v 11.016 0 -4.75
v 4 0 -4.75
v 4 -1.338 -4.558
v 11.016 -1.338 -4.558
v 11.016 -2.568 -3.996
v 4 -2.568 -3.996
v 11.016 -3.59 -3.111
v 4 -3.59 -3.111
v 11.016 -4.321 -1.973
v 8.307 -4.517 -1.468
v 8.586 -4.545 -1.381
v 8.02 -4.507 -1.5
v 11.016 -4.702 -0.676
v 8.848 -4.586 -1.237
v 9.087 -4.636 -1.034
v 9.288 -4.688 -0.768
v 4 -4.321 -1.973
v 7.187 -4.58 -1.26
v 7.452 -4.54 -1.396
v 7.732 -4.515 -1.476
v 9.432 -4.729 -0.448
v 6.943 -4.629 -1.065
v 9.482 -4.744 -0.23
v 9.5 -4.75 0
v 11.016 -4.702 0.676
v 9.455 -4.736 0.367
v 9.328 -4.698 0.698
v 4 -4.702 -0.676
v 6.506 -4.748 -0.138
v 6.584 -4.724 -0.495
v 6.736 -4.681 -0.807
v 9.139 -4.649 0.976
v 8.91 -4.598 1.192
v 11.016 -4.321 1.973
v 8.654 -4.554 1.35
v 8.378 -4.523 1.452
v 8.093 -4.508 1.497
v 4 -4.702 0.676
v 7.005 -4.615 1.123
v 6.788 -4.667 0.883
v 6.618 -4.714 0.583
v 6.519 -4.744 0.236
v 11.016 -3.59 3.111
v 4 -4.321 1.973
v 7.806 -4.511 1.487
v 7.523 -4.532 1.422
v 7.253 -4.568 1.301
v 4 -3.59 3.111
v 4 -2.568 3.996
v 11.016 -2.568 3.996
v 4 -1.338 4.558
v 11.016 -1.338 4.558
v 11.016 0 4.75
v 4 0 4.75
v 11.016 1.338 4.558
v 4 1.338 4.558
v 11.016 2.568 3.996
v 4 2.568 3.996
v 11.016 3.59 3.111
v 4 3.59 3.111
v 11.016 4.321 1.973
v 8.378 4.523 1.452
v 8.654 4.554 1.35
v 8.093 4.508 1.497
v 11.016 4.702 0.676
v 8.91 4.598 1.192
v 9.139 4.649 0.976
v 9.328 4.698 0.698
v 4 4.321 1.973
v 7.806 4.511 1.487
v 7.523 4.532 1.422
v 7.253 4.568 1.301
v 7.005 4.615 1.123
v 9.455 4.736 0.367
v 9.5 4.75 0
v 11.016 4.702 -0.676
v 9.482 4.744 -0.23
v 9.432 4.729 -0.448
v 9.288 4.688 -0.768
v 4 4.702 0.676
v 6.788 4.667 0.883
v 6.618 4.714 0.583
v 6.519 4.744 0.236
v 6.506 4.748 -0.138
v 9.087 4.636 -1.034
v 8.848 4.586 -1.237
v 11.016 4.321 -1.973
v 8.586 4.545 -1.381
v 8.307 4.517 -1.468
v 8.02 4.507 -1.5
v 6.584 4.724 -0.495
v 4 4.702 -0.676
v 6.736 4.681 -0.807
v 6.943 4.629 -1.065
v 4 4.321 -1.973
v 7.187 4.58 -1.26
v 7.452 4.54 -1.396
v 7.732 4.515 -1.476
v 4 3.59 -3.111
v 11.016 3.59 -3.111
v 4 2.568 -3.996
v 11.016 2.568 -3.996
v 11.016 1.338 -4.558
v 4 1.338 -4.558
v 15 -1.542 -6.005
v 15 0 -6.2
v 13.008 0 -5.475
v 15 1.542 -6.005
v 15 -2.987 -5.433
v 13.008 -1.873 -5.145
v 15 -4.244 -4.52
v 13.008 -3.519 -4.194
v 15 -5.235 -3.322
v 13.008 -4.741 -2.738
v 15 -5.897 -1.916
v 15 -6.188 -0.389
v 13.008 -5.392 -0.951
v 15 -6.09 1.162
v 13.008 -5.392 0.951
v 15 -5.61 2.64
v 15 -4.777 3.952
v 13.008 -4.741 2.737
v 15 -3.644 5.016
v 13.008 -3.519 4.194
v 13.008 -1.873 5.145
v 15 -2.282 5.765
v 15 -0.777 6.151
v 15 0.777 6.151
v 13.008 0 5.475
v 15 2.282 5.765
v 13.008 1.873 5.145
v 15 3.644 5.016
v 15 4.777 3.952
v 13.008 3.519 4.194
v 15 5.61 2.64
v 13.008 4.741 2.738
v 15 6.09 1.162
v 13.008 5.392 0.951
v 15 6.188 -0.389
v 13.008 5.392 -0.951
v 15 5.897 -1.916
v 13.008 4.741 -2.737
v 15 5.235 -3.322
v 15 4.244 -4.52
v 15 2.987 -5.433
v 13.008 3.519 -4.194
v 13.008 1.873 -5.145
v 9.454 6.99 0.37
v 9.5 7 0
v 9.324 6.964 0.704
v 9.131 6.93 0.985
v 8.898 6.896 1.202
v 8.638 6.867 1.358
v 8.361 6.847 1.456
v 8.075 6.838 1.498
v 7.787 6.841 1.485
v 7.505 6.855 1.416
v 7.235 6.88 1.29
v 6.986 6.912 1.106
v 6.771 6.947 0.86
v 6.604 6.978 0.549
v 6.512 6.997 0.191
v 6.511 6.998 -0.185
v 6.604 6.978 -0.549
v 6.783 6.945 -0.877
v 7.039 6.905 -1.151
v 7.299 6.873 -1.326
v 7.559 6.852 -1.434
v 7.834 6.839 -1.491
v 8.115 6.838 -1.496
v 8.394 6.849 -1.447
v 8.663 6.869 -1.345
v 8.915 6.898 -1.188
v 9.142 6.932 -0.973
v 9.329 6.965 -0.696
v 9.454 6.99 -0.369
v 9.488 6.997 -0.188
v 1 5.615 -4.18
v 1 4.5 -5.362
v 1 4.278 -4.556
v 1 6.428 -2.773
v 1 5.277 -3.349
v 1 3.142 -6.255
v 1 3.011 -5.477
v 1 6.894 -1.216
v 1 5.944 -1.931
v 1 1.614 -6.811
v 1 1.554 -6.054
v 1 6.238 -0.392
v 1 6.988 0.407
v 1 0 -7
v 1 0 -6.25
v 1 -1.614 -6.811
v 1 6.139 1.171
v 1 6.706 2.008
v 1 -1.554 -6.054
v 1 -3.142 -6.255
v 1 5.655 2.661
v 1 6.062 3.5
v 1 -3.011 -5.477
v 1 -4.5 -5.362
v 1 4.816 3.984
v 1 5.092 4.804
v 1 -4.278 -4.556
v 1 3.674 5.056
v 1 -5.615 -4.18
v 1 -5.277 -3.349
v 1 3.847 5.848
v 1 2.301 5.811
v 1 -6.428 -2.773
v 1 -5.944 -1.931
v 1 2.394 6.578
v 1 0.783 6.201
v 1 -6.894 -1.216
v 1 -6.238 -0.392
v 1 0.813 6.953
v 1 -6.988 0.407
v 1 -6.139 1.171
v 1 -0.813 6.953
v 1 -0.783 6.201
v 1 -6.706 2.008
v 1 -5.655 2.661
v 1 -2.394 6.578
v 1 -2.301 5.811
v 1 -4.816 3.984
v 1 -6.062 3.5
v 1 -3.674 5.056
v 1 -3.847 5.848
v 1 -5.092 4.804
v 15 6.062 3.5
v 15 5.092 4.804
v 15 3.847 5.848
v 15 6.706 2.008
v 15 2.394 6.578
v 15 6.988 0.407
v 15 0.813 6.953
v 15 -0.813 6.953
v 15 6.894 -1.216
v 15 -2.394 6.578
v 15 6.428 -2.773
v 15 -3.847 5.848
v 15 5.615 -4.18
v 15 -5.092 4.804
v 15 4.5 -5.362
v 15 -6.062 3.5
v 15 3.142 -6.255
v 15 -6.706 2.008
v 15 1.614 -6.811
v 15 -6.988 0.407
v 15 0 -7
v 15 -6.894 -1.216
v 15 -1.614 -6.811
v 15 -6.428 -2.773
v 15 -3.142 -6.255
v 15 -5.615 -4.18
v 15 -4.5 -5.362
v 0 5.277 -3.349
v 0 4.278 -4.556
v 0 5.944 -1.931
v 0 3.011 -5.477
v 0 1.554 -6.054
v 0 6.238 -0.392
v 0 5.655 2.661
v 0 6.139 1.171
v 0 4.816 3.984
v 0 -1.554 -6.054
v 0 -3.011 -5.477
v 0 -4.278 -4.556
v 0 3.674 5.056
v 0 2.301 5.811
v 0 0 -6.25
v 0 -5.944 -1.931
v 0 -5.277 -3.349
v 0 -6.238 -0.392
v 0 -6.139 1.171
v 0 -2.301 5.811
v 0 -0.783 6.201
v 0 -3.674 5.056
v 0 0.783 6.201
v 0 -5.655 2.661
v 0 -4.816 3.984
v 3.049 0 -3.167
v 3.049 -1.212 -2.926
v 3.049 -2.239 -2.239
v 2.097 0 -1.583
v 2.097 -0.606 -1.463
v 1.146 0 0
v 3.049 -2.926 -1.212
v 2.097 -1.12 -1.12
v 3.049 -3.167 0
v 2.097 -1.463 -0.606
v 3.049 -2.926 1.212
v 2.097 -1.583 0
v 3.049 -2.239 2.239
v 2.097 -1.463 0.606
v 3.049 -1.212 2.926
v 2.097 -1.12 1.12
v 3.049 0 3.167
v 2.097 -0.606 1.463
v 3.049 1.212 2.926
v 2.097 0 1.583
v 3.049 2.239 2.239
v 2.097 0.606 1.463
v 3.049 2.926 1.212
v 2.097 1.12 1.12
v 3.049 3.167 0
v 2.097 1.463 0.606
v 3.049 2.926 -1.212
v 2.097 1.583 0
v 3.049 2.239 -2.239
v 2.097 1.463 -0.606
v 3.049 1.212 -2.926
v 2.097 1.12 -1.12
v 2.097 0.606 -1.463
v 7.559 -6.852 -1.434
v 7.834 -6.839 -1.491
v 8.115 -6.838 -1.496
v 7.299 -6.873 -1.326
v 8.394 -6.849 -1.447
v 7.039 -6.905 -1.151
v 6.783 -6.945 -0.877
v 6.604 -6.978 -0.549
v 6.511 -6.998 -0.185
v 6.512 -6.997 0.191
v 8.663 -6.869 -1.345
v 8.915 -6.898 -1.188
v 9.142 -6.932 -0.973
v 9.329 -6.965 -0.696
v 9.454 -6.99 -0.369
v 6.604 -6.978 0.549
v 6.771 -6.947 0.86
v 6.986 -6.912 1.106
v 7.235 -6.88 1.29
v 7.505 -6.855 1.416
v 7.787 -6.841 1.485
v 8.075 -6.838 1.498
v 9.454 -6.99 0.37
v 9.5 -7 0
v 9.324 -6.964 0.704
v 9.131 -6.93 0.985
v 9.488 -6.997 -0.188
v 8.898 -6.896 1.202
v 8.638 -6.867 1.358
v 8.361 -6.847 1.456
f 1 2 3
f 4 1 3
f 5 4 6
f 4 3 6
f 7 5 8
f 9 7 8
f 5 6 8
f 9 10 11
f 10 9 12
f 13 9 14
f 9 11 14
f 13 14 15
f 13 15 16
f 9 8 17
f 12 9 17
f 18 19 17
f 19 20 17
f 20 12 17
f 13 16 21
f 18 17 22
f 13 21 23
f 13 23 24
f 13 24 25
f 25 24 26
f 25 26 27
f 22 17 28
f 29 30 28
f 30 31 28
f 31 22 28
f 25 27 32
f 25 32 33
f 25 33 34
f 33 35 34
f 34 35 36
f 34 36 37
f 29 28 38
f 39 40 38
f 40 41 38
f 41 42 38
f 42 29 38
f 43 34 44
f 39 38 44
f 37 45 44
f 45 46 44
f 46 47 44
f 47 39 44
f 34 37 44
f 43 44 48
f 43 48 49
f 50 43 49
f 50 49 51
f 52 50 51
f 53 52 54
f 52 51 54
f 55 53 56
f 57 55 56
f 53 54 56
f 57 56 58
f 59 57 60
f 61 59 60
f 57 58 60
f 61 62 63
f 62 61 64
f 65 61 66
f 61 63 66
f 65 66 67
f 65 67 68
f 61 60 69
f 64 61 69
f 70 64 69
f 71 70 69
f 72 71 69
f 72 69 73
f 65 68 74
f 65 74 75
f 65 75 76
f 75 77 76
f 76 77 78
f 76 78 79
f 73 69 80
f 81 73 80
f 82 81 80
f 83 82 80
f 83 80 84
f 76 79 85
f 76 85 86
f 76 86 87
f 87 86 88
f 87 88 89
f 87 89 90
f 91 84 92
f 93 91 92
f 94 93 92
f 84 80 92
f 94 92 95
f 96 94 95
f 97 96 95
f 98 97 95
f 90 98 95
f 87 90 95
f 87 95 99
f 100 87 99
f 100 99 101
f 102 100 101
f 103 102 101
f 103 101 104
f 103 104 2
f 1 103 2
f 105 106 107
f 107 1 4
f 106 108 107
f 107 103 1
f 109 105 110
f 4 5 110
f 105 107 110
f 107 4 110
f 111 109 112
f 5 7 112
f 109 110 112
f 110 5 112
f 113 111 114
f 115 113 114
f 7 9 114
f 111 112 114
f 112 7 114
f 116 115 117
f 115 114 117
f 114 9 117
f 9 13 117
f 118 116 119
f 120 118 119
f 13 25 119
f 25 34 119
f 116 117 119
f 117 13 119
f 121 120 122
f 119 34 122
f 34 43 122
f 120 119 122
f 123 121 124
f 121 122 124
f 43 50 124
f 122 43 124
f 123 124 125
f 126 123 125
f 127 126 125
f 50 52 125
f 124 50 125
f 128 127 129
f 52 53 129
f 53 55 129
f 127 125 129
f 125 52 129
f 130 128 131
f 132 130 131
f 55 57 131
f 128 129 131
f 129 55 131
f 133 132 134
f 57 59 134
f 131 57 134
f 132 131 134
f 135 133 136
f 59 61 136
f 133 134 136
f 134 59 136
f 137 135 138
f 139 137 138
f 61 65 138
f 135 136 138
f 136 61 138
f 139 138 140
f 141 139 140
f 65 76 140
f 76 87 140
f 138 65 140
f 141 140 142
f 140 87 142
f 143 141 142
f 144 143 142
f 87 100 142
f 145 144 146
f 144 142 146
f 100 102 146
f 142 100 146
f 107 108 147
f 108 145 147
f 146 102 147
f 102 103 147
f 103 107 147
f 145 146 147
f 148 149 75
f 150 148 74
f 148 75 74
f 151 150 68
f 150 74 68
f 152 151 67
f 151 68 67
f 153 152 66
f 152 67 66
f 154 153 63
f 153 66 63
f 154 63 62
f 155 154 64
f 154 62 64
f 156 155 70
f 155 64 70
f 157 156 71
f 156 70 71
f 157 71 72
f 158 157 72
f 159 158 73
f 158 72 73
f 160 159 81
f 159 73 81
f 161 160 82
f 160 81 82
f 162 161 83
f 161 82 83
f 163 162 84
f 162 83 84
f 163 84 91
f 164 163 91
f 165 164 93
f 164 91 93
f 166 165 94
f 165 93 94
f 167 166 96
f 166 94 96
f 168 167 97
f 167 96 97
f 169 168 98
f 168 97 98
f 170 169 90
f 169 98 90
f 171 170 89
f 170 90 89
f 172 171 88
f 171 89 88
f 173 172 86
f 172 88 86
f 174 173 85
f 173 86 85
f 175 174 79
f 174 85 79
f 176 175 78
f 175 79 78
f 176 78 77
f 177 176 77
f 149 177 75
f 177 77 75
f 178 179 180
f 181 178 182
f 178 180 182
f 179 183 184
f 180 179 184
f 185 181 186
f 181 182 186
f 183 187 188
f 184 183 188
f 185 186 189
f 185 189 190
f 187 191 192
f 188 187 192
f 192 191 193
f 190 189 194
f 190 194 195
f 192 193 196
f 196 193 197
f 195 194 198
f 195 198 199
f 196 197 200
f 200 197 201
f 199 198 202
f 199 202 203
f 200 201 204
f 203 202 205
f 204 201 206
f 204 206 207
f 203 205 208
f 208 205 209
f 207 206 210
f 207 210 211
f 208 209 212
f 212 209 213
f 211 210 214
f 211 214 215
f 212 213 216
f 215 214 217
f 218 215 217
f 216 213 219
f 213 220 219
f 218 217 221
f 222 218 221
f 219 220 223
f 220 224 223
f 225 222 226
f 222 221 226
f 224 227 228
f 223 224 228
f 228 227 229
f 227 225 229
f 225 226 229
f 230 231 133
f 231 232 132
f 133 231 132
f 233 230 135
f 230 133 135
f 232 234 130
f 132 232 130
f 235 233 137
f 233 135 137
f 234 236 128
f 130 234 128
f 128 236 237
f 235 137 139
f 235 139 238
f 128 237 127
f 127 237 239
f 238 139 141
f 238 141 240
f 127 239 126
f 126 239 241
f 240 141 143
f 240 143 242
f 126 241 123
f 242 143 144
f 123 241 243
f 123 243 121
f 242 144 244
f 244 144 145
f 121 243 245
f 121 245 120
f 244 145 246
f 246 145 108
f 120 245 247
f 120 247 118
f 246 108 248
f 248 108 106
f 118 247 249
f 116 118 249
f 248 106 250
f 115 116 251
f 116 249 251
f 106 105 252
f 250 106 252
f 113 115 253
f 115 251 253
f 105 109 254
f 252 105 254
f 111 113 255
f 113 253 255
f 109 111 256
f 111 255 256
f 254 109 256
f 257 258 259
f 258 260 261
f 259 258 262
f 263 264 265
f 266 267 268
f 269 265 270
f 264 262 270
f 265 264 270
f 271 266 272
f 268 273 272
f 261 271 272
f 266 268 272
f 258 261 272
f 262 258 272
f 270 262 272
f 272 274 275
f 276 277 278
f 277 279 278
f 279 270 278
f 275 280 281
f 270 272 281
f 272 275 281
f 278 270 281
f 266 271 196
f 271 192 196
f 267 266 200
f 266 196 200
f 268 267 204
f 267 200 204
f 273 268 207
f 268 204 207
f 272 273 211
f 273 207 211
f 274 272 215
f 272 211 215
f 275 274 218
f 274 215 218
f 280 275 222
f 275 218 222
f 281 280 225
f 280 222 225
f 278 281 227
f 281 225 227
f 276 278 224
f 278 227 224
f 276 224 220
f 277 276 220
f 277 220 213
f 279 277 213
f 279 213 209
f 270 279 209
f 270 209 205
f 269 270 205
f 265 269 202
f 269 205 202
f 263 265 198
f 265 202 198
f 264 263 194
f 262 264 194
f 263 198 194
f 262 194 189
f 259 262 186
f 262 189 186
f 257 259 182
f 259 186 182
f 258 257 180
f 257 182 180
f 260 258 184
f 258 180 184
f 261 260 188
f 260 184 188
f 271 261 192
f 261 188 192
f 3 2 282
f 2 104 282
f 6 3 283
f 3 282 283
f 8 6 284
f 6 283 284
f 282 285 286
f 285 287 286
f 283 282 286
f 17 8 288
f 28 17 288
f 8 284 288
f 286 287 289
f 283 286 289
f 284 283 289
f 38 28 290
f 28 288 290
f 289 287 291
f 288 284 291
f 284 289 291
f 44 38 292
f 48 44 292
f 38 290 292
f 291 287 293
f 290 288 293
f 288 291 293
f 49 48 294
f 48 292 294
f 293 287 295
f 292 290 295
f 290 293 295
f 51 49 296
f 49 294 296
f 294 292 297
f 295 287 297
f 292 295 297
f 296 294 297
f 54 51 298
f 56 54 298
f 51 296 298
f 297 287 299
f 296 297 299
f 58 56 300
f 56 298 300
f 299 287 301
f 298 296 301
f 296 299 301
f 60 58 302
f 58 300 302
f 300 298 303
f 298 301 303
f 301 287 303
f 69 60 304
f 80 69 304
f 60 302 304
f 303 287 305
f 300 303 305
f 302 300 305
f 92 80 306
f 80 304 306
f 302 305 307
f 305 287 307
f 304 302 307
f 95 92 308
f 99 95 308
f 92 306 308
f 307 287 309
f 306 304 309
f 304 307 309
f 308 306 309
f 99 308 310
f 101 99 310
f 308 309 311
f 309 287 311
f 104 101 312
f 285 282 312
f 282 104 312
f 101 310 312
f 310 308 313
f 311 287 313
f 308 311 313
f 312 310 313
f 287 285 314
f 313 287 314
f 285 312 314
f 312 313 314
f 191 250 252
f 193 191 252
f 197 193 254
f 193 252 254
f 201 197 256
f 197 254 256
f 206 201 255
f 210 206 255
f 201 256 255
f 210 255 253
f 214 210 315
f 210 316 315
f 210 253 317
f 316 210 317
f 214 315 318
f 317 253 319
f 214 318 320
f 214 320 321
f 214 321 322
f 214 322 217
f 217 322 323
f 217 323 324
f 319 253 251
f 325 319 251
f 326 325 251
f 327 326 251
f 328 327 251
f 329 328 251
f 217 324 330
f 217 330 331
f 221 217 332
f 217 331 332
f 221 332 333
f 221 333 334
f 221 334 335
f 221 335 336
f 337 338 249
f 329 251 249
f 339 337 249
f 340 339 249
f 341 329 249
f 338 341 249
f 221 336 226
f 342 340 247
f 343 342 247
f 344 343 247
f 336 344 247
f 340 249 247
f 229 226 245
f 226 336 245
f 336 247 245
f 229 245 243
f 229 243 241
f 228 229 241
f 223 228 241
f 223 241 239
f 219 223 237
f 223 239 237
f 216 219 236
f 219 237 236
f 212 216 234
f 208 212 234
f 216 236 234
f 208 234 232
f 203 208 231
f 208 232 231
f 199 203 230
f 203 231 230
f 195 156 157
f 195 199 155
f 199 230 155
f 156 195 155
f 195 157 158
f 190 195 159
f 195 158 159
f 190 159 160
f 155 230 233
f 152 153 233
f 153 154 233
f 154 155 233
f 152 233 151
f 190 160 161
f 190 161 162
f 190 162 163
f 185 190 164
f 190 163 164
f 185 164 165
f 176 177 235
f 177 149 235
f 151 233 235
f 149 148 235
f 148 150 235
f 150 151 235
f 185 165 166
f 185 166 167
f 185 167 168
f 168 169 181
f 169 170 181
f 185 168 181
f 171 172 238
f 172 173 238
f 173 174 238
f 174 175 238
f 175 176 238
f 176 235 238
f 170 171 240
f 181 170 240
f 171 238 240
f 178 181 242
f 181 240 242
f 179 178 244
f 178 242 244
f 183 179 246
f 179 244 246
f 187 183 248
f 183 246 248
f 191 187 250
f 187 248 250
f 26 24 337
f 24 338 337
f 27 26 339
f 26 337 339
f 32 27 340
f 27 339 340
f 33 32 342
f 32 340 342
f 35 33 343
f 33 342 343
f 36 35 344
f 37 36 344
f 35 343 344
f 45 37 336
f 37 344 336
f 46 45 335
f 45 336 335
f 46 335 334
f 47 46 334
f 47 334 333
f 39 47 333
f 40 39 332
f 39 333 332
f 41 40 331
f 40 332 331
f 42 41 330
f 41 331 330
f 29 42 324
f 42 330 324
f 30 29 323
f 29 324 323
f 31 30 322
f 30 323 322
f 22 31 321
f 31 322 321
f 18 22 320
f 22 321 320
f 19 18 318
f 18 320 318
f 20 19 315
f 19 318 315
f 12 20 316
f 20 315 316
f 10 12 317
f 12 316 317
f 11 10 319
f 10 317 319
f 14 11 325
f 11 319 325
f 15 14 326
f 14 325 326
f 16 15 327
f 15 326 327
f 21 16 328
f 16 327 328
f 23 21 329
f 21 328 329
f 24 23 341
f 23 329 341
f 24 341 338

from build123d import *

# Parameters (mm, degrees)
F2_R     = 1.5
F3_DEPTH = 12.5


with BuildPart() as f1:
    # F0 (on Front) → F1 (revolve)
    with BuildSketch(Plane.XZ):
        Polygon((1.145912, 0), (0, 0), (0, -6.25), (1, -6.25), (1, -7), (15, -7), (15, -6.2), (11.016158, -4.75), (4, -4.75), align=None)
    revolve(axis=Axis((0.572956, 0, 0), (-1, 0, 0)))

    # F2 (on Front) → F3 (cut, symmetric)
    with BuildSketch(Plane.XZ):
        with Locations((8, 0)):
            Circle(F2_R)
    extrude(amount=F3_DEPTH, both=True, mode=Mode.SUBTRACT)


solid = f1.part
